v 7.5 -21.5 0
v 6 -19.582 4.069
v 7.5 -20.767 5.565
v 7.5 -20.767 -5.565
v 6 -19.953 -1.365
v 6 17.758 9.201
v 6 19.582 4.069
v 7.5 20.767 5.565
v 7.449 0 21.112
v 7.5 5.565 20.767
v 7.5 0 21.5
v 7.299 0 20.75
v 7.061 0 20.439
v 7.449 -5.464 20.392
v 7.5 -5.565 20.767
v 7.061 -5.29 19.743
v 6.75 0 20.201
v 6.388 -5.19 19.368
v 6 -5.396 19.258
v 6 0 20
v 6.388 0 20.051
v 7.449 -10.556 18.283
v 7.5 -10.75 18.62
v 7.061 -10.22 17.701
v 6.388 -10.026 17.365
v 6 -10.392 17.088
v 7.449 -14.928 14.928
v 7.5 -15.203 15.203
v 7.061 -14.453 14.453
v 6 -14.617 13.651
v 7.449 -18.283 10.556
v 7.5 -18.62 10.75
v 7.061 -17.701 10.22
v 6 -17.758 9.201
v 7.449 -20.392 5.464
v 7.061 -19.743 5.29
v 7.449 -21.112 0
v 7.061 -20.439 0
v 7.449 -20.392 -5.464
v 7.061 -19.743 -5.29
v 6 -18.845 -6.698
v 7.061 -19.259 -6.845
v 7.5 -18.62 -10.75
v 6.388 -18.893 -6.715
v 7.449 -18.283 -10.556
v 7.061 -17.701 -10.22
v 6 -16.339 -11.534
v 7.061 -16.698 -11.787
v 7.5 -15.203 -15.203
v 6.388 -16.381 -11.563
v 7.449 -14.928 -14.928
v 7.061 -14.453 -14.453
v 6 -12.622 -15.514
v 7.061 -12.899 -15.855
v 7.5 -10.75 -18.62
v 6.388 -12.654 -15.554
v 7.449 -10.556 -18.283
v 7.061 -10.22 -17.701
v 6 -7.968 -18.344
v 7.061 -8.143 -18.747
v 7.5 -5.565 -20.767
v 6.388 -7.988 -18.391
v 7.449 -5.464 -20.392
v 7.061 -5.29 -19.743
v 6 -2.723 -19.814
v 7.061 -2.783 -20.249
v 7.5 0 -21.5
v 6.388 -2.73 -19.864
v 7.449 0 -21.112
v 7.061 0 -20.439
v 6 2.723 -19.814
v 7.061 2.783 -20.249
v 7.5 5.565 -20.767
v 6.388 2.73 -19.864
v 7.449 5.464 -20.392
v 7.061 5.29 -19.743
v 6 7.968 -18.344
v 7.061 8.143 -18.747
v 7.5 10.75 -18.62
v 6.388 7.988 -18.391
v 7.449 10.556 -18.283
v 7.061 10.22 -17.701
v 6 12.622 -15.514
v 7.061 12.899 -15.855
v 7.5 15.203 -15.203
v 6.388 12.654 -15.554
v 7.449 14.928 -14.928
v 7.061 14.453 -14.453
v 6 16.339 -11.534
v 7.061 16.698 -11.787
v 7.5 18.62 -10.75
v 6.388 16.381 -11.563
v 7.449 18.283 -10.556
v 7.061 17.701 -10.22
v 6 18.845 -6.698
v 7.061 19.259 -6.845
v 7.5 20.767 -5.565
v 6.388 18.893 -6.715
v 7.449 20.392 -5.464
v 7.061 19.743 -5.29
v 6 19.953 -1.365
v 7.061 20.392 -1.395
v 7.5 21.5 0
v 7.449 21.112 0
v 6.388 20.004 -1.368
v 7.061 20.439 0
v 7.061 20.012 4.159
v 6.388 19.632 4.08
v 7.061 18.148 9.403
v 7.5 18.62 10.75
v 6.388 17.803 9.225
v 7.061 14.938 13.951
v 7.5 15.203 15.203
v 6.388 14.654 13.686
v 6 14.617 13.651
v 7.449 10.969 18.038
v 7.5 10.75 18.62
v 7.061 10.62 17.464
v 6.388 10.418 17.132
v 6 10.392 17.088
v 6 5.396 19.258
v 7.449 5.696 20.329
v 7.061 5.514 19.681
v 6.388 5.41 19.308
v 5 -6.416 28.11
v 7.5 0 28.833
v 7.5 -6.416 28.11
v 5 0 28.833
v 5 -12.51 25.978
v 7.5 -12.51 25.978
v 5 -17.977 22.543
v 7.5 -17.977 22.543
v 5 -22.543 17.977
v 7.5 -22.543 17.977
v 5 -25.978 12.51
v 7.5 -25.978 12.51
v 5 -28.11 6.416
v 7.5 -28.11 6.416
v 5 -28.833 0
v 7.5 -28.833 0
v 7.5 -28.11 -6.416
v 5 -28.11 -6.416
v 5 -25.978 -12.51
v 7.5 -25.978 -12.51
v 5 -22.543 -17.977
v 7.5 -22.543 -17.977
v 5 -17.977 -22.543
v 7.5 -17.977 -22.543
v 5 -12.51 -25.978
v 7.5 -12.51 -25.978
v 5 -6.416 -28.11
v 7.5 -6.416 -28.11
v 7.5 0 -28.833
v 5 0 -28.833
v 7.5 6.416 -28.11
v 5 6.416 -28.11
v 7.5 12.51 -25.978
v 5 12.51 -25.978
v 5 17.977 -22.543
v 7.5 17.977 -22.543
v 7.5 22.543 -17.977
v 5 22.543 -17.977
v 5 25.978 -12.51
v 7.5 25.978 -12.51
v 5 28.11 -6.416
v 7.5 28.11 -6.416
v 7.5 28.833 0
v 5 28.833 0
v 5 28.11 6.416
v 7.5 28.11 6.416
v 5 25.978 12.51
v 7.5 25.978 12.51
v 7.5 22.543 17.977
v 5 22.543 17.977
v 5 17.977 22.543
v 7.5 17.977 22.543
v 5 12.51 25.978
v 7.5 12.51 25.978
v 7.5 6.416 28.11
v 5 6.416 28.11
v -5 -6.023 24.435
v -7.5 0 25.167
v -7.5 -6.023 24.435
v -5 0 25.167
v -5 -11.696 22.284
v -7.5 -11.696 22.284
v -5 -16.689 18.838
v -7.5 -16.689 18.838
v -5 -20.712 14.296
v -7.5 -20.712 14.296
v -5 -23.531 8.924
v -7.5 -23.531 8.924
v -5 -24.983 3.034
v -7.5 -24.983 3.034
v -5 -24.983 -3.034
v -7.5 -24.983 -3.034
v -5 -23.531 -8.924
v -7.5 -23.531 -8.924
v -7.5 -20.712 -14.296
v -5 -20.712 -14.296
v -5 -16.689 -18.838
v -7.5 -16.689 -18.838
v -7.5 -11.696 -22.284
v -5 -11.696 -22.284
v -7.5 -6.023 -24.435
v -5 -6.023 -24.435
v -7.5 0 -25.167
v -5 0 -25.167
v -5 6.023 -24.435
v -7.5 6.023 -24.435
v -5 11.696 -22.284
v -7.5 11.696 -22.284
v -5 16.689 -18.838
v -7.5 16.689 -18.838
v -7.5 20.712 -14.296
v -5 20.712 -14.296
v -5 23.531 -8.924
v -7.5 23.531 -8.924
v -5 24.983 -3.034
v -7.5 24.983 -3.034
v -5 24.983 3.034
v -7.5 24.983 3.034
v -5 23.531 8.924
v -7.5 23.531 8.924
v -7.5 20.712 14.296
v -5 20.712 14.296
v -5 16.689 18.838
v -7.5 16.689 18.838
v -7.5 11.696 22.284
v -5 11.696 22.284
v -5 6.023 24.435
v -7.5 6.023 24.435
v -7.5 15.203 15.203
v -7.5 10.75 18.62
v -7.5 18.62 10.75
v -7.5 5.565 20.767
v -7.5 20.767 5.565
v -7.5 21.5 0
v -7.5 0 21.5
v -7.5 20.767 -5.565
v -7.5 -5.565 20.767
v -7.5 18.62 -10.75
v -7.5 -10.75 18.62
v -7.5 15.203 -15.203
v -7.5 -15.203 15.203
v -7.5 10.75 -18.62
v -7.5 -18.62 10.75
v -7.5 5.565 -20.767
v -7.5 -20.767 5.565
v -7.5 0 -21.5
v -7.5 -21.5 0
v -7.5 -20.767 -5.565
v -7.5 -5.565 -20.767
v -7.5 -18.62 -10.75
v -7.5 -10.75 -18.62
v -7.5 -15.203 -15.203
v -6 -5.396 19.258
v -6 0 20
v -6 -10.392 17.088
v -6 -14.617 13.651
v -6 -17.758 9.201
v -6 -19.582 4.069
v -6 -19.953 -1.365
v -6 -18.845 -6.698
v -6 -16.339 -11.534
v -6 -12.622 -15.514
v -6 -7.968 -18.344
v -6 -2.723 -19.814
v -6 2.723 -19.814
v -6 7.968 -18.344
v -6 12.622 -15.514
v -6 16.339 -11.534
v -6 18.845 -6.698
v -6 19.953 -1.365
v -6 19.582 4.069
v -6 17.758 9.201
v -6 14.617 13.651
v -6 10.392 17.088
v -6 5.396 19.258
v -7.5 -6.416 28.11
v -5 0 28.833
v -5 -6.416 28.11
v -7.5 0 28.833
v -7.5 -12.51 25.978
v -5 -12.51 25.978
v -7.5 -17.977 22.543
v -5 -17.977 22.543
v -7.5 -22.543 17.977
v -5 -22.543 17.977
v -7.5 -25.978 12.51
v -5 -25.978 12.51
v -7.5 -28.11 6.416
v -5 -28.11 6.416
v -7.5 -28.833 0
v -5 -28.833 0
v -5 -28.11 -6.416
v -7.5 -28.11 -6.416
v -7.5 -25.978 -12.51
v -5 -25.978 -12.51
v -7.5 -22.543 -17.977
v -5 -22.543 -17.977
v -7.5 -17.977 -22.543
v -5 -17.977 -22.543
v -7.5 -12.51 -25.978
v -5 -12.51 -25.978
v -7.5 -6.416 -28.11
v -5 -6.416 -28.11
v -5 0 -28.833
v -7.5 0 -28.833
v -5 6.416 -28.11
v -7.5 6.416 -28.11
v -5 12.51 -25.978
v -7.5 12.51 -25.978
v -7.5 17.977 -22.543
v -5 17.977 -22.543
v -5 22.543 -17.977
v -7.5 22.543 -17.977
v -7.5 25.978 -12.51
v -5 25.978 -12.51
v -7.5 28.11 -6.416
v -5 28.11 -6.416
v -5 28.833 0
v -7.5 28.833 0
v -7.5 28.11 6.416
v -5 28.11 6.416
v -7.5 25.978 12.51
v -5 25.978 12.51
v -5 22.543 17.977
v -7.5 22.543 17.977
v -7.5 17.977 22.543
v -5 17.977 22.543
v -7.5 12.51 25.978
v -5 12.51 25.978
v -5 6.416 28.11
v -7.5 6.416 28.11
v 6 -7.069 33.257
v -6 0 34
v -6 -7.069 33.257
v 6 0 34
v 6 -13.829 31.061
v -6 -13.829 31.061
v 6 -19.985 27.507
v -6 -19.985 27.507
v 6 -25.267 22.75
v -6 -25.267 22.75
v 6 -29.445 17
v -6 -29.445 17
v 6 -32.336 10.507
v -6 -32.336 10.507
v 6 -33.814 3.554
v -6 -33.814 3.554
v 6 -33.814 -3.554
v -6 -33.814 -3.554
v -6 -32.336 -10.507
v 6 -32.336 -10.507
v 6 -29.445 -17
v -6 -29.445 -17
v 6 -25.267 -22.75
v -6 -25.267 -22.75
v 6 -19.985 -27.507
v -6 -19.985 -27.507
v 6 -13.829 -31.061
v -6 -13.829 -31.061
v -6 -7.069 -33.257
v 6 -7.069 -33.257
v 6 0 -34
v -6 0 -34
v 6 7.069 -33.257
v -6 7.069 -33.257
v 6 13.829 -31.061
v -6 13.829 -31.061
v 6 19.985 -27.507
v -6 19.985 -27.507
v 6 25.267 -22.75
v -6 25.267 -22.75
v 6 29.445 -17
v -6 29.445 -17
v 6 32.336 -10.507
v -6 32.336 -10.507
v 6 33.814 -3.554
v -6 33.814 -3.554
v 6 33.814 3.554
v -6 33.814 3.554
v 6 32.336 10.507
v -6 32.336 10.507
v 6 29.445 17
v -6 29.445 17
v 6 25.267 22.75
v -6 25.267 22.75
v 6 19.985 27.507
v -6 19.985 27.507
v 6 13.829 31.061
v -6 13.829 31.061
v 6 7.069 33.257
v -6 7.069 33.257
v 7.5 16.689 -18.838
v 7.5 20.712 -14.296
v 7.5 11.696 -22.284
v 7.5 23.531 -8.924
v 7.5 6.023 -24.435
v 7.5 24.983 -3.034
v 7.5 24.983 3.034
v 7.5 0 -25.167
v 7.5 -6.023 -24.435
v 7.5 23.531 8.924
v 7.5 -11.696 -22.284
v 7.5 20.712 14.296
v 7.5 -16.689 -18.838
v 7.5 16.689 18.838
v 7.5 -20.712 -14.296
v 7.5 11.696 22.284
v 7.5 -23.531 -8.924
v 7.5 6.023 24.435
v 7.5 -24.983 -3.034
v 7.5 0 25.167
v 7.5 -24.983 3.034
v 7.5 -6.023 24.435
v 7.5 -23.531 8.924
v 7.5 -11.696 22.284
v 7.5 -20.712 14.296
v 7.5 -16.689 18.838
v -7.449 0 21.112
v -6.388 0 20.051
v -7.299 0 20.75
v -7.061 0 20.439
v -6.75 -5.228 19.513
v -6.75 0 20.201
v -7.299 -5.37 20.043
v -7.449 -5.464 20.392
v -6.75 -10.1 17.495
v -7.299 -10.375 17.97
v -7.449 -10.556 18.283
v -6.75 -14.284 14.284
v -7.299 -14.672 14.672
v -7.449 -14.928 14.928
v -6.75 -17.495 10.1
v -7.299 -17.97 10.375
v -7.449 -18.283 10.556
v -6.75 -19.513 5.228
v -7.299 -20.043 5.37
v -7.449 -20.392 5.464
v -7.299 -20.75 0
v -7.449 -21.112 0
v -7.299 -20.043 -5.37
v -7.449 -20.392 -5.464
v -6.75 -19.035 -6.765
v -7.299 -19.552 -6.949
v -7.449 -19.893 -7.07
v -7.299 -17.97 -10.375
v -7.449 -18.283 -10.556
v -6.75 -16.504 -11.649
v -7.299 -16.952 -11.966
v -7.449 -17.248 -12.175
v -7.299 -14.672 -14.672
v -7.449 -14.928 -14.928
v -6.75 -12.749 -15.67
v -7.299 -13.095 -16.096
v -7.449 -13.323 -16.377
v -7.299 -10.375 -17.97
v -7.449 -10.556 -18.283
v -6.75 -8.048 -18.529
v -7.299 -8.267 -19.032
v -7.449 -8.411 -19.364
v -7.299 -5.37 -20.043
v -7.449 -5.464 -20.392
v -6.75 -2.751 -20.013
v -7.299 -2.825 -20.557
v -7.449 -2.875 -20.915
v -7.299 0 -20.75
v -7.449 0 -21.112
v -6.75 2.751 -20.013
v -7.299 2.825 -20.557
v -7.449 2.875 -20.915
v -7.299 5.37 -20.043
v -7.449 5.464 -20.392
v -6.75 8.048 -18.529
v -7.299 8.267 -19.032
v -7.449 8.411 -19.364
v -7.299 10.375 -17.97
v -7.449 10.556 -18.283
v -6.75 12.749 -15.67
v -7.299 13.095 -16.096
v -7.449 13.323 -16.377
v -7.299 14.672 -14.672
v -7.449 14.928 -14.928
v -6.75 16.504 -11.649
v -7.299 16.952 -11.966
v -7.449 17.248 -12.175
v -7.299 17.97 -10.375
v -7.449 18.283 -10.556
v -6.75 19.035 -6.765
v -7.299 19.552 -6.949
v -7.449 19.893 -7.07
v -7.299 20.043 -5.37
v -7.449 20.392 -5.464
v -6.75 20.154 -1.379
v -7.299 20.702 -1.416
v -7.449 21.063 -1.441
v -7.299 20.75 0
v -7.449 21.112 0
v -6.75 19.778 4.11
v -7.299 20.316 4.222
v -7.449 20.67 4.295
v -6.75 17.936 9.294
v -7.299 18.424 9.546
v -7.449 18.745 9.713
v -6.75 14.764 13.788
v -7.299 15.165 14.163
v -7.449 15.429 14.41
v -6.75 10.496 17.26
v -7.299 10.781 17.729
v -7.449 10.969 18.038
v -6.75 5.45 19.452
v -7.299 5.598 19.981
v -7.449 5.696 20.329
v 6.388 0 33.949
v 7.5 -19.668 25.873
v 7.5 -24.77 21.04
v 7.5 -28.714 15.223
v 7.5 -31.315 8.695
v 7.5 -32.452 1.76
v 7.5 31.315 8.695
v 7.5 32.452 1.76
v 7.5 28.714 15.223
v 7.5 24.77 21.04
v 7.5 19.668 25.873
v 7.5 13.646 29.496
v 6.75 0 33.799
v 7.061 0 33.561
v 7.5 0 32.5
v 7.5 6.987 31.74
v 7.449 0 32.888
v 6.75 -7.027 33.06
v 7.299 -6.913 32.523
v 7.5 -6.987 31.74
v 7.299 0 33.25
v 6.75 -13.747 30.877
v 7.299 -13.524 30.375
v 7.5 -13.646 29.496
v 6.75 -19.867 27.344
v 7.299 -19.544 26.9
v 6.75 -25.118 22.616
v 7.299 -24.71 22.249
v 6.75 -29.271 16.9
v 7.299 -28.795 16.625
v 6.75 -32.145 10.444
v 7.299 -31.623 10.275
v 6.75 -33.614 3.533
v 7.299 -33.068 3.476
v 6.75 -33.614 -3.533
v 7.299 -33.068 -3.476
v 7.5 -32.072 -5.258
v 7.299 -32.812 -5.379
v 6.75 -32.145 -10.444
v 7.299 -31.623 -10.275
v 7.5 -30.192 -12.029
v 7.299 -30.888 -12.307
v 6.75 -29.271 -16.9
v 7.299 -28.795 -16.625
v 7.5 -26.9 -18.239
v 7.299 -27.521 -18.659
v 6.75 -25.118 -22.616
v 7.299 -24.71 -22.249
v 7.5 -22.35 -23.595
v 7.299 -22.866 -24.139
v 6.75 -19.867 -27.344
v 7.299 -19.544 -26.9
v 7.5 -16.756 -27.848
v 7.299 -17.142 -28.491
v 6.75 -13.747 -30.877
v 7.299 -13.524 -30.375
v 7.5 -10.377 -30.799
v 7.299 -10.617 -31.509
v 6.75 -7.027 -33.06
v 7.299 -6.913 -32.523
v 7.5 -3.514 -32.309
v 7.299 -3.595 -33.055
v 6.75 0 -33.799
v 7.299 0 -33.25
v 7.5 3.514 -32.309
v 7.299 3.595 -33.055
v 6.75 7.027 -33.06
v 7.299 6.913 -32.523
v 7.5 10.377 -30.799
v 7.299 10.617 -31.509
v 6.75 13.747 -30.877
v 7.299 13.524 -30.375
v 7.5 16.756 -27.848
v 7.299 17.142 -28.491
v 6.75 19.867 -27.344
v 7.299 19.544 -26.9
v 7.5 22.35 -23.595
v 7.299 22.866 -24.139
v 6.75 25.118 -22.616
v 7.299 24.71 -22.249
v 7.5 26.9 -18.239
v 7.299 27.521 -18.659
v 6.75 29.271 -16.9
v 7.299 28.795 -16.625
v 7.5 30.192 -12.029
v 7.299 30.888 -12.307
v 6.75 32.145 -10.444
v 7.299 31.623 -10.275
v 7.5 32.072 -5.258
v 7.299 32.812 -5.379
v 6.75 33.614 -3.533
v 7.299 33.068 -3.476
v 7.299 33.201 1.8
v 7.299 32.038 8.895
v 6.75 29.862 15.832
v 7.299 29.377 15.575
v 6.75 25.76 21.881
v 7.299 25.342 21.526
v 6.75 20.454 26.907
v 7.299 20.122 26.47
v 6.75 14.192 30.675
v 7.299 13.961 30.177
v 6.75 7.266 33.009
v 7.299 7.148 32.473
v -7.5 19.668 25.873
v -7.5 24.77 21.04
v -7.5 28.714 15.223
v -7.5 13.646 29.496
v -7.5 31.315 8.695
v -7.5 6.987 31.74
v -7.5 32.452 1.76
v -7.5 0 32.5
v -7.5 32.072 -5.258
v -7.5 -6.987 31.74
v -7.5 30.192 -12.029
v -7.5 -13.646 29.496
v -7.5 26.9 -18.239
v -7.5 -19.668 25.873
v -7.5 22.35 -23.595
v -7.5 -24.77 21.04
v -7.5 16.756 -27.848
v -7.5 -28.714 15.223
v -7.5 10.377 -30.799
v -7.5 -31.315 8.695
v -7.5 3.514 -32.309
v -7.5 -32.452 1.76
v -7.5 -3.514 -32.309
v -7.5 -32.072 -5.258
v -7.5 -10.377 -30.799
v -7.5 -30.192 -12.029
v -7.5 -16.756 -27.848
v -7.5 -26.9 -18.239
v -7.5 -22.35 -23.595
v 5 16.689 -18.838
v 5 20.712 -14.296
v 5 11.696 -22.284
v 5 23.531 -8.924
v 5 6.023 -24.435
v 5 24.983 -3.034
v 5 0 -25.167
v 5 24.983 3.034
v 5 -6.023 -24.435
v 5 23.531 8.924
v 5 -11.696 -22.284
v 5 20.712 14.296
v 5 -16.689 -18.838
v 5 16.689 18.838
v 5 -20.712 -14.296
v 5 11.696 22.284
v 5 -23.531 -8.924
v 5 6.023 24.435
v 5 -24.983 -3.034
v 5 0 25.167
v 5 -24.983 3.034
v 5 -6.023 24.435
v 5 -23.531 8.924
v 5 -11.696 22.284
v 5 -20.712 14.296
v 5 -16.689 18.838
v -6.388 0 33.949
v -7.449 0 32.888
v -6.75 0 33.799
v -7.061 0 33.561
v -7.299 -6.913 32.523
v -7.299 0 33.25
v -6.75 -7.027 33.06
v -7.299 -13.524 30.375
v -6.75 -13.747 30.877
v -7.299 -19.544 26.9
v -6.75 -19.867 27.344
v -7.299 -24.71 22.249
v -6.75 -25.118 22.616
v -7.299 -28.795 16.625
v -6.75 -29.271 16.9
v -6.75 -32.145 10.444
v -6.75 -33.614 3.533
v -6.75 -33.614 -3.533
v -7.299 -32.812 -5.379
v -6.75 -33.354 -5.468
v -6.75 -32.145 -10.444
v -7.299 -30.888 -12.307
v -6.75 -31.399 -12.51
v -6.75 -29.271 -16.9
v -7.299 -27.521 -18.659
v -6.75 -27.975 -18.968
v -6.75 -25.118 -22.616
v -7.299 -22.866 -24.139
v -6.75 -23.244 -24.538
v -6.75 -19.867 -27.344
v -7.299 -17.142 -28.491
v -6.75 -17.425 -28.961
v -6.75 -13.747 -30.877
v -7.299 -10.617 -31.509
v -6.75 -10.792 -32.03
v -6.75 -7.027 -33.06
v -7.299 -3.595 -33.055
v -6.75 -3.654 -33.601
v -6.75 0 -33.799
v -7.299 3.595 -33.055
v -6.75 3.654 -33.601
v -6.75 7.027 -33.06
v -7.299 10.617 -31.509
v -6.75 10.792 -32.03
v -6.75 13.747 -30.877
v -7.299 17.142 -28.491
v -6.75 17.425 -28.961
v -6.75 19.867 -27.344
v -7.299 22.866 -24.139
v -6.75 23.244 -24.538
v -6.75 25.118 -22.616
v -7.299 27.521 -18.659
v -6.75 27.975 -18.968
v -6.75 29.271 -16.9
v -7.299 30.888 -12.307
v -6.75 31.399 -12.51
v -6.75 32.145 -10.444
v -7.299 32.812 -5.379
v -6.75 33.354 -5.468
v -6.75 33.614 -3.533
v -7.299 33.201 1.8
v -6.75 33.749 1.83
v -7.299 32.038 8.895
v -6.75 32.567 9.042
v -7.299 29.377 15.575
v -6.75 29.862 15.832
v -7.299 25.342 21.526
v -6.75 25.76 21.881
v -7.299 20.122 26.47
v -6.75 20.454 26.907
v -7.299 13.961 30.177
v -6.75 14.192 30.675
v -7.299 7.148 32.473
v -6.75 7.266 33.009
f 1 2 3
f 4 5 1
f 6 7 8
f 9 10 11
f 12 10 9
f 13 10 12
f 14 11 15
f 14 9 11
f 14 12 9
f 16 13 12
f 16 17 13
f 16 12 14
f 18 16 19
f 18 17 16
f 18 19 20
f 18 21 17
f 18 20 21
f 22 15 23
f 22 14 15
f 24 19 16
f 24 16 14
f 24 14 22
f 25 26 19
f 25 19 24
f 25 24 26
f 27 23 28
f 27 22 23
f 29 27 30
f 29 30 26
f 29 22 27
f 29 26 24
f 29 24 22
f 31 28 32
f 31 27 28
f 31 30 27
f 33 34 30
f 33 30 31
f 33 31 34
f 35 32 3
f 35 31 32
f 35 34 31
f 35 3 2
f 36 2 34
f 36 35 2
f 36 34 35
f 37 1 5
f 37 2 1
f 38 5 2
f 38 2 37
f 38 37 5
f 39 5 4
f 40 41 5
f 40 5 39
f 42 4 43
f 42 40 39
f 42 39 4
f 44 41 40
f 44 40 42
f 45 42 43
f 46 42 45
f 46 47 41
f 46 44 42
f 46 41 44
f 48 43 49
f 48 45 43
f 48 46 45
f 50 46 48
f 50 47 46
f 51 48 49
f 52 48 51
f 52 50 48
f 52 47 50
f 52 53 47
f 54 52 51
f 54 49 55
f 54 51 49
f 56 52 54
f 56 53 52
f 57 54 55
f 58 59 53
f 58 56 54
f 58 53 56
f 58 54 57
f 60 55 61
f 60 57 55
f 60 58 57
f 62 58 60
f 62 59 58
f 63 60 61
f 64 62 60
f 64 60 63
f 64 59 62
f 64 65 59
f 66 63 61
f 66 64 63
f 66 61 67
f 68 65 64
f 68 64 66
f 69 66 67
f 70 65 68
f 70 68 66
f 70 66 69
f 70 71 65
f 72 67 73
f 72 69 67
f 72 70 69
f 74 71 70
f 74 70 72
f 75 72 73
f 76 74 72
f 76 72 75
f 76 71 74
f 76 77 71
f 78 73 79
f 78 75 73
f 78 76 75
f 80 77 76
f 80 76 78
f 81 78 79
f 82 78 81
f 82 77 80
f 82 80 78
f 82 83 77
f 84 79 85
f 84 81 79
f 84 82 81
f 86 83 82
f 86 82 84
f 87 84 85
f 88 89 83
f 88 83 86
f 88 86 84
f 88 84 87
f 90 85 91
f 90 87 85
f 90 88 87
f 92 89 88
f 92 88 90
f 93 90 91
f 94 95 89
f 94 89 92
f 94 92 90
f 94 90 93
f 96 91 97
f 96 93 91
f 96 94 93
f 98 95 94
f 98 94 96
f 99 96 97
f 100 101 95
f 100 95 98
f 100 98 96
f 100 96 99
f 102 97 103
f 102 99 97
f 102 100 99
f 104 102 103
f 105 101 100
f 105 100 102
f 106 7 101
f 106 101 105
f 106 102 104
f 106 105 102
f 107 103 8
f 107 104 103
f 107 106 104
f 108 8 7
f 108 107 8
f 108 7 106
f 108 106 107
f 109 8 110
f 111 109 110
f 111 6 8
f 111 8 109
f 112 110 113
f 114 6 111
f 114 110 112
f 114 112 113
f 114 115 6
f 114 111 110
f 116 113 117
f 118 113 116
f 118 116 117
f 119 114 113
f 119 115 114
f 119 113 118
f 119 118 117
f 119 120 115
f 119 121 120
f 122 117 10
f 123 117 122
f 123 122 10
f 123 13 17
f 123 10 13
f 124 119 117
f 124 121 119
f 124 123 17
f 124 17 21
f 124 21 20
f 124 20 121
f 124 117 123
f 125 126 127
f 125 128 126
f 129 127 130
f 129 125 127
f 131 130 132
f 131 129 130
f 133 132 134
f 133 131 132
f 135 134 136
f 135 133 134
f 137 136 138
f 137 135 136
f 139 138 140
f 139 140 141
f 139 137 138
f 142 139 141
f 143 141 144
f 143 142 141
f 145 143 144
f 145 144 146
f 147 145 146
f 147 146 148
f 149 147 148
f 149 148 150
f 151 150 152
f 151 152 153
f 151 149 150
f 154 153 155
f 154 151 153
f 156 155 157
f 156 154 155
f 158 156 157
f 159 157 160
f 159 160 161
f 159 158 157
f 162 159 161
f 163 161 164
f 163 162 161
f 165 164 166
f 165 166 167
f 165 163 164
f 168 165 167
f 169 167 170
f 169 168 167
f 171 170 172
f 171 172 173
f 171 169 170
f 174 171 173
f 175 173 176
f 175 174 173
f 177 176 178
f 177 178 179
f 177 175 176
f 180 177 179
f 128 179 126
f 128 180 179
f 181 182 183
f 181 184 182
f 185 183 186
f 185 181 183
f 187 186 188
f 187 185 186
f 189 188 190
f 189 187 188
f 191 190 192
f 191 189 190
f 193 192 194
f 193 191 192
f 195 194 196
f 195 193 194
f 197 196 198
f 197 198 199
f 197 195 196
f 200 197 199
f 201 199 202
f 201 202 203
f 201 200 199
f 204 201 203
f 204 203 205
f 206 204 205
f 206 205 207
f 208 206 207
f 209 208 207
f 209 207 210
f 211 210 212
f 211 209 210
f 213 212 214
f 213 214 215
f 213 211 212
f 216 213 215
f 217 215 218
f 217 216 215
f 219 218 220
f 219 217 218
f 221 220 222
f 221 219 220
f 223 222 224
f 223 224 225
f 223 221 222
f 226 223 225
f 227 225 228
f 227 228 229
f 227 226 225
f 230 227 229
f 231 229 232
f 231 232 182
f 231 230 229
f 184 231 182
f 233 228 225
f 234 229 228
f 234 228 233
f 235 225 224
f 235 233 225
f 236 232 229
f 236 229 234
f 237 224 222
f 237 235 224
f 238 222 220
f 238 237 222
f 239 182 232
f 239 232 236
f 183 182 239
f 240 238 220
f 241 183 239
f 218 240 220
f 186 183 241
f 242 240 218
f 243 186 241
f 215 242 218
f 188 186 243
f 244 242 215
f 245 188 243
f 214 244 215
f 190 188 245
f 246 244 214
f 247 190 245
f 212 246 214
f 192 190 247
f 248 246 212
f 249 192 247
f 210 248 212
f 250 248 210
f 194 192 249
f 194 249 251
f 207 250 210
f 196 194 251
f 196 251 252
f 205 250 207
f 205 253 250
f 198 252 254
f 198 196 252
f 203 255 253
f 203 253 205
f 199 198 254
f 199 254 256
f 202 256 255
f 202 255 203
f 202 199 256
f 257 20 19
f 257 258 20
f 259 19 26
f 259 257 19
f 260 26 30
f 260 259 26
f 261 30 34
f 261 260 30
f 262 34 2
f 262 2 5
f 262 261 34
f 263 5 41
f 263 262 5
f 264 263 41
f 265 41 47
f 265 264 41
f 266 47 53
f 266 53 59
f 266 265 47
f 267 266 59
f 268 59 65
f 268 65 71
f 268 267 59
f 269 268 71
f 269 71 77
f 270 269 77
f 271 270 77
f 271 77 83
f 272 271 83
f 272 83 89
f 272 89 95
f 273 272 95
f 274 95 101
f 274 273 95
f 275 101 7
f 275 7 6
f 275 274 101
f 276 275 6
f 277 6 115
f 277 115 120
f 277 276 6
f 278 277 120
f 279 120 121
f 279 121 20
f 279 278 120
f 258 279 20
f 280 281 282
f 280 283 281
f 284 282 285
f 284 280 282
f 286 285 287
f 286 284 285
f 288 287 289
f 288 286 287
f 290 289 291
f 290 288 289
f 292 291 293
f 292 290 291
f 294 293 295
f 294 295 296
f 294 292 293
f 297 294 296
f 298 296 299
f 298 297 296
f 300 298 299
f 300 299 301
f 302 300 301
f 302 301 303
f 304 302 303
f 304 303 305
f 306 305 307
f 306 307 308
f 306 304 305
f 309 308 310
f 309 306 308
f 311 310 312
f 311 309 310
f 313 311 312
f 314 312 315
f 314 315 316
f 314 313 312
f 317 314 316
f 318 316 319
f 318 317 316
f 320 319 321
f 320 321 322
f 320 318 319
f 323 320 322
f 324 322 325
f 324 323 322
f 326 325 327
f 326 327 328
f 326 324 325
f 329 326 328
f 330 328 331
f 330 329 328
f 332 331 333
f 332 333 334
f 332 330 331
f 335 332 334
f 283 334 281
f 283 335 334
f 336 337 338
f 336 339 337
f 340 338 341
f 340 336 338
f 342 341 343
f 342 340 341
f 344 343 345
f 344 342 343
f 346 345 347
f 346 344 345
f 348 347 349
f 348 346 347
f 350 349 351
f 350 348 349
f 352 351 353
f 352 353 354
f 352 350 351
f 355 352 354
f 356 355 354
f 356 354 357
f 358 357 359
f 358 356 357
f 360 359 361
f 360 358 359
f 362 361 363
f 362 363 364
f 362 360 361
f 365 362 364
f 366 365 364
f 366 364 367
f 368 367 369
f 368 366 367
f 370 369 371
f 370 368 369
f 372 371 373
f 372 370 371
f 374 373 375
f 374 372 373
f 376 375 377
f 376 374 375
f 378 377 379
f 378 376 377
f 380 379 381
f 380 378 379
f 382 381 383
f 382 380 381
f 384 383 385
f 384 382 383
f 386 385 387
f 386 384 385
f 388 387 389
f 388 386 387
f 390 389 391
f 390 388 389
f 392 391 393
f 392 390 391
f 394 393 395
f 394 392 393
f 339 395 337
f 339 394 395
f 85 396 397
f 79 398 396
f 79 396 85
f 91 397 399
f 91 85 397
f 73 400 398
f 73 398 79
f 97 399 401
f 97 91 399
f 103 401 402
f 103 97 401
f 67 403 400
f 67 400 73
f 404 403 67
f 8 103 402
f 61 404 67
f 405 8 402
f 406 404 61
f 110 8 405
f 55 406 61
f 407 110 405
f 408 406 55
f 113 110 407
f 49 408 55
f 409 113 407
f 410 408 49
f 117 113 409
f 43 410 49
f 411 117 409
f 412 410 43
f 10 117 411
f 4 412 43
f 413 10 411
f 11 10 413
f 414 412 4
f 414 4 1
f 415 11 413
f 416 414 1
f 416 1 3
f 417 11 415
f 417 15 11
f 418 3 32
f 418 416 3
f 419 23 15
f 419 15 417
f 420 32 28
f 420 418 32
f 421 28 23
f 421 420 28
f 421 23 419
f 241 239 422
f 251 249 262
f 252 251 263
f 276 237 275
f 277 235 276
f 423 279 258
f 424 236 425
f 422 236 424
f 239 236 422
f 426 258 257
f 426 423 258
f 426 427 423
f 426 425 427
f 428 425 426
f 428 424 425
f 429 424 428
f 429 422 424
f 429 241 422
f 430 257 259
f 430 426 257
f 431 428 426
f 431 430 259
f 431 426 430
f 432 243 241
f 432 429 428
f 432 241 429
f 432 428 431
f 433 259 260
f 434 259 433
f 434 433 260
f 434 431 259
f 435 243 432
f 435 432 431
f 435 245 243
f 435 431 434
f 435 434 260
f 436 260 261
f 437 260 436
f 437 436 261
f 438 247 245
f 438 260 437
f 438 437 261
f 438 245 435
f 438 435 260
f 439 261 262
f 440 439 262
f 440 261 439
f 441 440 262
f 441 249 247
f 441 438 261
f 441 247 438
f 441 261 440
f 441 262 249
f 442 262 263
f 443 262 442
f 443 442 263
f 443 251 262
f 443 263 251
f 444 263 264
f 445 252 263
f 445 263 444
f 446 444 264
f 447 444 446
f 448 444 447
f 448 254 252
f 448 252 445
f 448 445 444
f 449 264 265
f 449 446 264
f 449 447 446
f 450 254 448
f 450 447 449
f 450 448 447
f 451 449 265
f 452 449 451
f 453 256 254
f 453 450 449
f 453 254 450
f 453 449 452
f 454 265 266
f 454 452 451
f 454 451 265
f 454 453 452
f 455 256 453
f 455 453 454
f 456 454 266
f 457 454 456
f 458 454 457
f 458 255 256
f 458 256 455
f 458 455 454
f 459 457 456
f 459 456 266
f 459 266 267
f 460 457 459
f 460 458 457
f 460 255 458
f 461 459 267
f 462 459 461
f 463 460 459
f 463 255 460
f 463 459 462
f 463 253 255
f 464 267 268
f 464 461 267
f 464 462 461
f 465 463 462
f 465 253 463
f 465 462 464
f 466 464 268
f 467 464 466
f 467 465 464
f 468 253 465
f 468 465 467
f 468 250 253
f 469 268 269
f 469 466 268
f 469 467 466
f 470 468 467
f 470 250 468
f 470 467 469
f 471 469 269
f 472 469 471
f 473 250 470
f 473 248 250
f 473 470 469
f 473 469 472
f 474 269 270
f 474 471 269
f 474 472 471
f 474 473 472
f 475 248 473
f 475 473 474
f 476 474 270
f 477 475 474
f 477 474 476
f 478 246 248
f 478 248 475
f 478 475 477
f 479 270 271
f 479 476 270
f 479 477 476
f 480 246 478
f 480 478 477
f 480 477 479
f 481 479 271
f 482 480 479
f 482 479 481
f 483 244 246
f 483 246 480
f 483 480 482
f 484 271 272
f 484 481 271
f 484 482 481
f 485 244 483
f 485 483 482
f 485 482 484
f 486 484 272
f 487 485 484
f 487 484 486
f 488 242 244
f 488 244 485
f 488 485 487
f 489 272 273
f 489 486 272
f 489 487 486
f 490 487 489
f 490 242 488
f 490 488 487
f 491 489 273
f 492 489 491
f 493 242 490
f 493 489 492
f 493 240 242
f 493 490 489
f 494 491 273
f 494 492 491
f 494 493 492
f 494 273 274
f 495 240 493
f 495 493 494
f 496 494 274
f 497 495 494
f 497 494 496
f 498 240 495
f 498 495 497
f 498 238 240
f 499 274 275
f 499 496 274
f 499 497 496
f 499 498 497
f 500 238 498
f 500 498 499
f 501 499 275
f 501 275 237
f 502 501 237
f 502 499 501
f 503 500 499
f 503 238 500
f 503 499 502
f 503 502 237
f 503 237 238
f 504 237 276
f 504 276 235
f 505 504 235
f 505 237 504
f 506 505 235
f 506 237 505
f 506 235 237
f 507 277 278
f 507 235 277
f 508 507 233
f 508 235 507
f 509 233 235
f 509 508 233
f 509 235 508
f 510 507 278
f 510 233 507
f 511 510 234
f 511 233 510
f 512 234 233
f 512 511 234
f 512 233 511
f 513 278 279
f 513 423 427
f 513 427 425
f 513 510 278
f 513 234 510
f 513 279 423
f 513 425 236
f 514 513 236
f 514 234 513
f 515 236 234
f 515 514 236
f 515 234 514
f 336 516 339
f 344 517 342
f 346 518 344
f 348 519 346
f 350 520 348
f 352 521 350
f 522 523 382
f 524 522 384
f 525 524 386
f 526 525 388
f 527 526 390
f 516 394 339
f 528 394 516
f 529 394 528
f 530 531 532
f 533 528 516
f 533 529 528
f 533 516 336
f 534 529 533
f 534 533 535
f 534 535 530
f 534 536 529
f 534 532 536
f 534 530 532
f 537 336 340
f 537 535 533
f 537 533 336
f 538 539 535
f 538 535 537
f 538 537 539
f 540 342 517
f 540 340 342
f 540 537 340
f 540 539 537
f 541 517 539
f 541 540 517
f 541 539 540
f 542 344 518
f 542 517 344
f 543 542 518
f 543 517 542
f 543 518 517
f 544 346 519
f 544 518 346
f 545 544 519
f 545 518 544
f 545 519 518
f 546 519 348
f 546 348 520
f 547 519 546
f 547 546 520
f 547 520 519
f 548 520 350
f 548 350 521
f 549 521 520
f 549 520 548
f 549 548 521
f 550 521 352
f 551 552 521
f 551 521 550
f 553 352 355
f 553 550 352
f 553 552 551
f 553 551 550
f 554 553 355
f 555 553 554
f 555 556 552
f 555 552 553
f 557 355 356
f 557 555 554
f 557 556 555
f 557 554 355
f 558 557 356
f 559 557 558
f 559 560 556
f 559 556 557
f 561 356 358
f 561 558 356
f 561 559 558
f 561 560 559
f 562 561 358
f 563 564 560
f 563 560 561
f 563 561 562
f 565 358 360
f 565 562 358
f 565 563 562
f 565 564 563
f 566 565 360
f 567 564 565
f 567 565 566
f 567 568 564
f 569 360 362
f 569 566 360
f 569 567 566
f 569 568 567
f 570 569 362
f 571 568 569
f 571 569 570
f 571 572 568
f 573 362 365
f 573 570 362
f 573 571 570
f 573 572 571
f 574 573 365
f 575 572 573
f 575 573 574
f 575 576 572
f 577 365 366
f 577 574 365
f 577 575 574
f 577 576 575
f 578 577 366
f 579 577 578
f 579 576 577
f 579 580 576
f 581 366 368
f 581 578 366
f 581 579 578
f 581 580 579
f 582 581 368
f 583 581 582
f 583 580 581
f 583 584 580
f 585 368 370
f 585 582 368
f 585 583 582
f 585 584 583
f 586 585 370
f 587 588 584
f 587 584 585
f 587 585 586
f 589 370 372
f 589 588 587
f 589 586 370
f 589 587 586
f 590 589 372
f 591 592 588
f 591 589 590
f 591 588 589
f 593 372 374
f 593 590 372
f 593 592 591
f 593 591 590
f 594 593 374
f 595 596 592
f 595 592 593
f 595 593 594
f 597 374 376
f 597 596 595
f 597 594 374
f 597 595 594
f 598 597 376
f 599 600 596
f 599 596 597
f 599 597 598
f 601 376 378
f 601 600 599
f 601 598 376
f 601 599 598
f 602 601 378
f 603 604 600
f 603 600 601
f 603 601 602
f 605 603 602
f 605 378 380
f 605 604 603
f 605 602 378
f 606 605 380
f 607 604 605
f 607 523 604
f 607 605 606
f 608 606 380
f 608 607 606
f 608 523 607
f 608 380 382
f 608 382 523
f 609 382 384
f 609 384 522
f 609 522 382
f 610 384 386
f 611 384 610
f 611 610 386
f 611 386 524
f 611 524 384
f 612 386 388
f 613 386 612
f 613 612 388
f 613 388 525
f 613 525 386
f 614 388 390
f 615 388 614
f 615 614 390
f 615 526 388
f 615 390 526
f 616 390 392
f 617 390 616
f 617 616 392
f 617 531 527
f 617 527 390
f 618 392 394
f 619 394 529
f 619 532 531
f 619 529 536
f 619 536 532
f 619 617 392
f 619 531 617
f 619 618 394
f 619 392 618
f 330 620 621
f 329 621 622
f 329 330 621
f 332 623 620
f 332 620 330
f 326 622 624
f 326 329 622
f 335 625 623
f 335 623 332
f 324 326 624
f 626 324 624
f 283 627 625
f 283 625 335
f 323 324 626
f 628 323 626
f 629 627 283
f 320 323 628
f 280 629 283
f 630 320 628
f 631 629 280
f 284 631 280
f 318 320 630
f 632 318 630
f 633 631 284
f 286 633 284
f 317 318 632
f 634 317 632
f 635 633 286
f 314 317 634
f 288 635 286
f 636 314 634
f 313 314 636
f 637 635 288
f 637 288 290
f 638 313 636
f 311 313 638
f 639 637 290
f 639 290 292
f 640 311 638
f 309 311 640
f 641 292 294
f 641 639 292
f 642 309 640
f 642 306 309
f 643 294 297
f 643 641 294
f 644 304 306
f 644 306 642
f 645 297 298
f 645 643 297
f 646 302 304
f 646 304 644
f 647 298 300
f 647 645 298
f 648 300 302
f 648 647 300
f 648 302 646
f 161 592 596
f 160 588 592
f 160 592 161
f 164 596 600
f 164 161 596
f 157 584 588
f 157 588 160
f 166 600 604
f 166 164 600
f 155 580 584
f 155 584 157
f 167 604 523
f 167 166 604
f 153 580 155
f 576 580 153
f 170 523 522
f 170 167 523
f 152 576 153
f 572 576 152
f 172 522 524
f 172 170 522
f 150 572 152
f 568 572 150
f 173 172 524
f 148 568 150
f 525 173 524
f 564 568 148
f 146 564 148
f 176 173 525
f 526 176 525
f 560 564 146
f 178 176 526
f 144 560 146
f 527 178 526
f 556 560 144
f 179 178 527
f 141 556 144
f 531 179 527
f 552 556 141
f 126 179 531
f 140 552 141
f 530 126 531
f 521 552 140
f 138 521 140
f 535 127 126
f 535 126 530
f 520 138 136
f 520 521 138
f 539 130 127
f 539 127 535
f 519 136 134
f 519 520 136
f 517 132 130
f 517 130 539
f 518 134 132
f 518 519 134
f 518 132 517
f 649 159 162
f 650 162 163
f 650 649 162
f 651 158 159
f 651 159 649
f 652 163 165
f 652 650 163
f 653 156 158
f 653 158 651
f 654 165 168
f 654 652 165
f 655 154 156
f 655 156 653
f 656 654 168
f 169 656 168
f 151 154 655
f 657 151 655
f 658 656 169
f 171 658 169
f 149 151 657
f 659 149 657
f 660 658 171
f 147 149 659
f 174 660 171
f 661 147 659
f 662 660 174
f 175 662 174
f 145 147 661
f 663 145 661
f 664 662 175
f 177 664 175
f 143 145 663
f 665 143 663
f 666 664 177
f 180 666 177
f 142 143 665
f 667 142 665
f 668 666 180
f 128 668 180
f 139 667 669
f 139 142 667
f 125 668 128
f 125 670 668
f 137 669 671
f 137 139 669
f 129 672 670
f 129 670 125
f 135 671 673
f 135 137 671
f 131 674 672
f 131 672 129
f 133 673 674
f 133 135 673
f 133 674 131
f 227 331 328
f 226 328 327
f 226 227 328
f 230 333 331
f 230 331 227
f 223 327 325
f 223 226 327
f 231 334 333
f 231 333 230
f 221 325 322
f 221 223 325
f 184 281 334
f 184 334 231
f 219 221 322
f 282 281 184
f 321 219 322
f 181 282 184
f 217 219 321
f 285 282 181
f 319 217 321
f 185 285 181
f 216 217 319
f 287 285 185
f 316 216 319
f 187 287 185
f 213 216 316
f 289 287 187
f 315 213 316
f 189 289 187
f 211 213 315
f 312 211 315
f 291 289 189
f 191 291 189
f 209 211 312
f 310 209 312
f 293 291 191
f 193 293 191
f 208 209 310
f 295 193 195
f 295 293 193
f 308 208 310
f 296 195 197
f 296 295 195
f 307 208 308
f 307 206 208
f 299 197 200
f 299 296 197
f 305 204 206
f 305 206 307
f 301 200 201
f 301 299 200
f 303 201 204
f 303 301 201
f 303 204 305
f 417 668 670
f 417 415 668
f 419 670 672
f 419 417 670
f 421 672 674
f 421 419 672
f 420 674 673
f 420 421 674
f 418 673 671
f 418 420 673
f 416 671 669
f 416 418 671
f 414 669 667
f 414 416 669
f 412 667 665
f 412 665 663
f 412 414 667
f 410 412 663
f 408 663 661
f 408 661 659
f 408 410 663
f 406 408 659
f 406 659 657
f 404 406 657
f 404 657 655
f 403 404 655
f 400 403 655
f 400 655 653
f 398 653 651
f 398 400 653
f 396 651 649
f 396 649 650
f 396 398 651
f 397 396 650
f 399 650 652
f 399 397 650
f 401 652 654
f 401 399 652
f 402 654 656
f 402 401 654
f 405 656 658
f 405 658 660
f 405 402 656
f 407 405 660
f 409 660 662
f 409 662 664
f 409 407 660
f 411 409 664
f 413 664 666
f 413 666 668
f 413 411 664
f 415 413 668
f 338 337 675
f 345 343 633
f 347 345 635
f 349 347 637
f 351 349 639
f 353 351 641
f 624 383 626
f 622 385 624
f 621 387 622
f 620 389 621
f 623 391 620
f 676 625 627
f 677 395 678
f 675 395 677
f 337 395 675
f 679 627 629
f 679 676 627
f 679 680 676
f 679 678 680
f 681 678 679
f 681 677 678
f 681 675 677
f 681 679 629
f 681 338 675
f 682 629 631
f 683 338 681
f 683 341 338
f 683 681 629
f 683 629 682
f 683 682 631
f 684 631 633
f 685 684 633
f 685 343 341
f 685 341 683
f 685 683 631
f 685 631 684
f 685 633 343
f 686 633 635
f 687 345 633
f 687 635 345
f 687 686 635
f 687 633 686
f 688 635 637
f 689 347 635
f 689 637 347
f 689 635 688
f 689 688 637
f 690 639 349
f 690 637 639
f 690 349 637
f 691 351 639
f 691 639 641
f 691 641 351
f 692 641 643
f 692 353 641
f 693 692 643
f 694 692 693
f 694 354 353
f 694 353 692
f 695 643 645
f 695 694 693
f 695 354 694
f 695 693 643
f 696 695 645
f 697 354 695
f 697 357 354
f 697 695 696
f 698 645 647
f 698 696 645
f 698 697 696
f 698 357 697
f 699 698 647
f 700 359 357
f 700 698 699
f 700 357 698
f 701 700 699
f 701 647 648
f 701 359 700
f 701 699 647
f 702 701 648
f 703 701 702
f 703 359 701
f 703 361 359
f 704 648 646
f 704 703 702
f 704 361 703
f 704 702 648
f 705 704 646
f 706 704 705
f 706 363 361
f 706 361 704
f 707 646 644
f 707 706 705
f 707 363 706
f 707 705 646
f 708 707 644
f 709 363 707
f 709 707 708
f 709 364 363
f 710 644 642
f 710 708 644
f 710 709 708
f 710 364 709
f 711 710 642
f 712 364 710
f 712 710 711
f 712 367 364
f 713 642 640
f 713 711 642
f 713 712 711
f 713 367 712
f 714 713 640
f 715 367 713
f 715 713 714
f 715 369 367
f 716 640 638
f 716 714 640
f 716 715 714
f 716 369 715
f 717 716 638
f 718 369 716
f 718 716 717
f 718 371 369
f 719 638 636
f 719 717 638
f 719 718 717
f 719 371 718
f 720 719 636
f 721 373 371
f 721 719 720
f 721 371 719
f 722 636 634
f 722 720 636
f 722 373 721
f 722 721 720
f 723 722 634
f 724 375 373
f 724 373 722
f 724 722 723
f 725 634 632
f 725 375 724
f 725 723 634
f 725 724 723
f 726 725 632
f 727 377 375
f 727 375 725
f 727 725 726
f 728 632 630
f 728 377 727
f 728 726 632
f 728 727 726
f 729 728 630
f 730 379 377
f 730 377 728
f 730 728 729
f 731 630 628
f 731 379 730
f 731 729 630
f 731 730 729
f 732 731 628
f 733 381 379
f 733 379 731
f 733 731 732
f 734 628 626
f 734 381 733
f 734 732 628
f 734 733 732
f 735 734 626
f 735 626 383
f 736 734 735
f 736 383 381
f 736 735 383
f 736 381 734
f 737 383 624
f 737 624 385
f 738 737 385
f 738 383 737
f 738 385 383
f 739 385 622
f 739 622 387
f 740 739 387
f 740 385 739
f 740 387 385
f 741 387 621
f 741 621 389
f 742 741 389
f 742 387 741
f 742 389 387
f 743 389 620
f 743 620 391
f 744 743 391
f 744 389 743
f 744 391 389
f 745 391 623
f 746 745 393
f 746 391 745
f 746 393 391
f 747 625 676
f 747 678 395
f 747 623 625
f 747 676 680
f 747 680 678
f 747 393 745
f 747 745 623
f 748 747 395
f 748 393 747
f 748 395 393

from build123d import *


with BuildPart() as part:
    # Эскиз1 → Повернуть1 (revolve)
    with BuildSketch(Plane.XY, mode=Mode.PRIVATE) as revolve_1_sk:
        with BuildLine():
            Line((6, 20), (-6, 20))
            ThreePointArc((-6, 20), (-7.060660172, 20.439339828), (-7.5, 21.5))
            Line((-7.5, 21.5), (-7.5, 25.166666667))
            Line((-7.5, 25.166666667), (-5, 25.166666667))
            Line((-5, 25.166666667), (-5, 28.833333333))
            Line((-5, 28.833333333), (-7.5, 28.833333333))
            Line((-7.5, 28.833333333), (-7.5, 32.5))
            ThreePointArc((-7.5, 32.5), (-7.060660172, 33.560660172), (-6, 34))
            Line((-6, 34), (6, 34))
            ThreePointArc((6, 34), (7.060660172, 33.560660172), (7.5, 32.5))
            Line((7.5, 32.5), (7.5, 28.833333333))
            Line((7.5, 28.833333333), (5, 28.833333333))
            Line((5, 28.833333333), (5, 25.166666667))
            Line((5, 25.166666667), (7.5, 25.166666667))
            Line((7.5, 25.166666667), (7.5, 21.5))
            ThreePointArc((7.5, 21.5), (7.060660172, 20.439339828), (6, 20))
        make_face()
    revolve(revolve_1_sk.sketch.rotate(Axis((-1000, 0, 0), (1, 0, 0)), 90), axis=Axis((-1000, 0, 0), (1, 0, 0)))


solid = part.part
